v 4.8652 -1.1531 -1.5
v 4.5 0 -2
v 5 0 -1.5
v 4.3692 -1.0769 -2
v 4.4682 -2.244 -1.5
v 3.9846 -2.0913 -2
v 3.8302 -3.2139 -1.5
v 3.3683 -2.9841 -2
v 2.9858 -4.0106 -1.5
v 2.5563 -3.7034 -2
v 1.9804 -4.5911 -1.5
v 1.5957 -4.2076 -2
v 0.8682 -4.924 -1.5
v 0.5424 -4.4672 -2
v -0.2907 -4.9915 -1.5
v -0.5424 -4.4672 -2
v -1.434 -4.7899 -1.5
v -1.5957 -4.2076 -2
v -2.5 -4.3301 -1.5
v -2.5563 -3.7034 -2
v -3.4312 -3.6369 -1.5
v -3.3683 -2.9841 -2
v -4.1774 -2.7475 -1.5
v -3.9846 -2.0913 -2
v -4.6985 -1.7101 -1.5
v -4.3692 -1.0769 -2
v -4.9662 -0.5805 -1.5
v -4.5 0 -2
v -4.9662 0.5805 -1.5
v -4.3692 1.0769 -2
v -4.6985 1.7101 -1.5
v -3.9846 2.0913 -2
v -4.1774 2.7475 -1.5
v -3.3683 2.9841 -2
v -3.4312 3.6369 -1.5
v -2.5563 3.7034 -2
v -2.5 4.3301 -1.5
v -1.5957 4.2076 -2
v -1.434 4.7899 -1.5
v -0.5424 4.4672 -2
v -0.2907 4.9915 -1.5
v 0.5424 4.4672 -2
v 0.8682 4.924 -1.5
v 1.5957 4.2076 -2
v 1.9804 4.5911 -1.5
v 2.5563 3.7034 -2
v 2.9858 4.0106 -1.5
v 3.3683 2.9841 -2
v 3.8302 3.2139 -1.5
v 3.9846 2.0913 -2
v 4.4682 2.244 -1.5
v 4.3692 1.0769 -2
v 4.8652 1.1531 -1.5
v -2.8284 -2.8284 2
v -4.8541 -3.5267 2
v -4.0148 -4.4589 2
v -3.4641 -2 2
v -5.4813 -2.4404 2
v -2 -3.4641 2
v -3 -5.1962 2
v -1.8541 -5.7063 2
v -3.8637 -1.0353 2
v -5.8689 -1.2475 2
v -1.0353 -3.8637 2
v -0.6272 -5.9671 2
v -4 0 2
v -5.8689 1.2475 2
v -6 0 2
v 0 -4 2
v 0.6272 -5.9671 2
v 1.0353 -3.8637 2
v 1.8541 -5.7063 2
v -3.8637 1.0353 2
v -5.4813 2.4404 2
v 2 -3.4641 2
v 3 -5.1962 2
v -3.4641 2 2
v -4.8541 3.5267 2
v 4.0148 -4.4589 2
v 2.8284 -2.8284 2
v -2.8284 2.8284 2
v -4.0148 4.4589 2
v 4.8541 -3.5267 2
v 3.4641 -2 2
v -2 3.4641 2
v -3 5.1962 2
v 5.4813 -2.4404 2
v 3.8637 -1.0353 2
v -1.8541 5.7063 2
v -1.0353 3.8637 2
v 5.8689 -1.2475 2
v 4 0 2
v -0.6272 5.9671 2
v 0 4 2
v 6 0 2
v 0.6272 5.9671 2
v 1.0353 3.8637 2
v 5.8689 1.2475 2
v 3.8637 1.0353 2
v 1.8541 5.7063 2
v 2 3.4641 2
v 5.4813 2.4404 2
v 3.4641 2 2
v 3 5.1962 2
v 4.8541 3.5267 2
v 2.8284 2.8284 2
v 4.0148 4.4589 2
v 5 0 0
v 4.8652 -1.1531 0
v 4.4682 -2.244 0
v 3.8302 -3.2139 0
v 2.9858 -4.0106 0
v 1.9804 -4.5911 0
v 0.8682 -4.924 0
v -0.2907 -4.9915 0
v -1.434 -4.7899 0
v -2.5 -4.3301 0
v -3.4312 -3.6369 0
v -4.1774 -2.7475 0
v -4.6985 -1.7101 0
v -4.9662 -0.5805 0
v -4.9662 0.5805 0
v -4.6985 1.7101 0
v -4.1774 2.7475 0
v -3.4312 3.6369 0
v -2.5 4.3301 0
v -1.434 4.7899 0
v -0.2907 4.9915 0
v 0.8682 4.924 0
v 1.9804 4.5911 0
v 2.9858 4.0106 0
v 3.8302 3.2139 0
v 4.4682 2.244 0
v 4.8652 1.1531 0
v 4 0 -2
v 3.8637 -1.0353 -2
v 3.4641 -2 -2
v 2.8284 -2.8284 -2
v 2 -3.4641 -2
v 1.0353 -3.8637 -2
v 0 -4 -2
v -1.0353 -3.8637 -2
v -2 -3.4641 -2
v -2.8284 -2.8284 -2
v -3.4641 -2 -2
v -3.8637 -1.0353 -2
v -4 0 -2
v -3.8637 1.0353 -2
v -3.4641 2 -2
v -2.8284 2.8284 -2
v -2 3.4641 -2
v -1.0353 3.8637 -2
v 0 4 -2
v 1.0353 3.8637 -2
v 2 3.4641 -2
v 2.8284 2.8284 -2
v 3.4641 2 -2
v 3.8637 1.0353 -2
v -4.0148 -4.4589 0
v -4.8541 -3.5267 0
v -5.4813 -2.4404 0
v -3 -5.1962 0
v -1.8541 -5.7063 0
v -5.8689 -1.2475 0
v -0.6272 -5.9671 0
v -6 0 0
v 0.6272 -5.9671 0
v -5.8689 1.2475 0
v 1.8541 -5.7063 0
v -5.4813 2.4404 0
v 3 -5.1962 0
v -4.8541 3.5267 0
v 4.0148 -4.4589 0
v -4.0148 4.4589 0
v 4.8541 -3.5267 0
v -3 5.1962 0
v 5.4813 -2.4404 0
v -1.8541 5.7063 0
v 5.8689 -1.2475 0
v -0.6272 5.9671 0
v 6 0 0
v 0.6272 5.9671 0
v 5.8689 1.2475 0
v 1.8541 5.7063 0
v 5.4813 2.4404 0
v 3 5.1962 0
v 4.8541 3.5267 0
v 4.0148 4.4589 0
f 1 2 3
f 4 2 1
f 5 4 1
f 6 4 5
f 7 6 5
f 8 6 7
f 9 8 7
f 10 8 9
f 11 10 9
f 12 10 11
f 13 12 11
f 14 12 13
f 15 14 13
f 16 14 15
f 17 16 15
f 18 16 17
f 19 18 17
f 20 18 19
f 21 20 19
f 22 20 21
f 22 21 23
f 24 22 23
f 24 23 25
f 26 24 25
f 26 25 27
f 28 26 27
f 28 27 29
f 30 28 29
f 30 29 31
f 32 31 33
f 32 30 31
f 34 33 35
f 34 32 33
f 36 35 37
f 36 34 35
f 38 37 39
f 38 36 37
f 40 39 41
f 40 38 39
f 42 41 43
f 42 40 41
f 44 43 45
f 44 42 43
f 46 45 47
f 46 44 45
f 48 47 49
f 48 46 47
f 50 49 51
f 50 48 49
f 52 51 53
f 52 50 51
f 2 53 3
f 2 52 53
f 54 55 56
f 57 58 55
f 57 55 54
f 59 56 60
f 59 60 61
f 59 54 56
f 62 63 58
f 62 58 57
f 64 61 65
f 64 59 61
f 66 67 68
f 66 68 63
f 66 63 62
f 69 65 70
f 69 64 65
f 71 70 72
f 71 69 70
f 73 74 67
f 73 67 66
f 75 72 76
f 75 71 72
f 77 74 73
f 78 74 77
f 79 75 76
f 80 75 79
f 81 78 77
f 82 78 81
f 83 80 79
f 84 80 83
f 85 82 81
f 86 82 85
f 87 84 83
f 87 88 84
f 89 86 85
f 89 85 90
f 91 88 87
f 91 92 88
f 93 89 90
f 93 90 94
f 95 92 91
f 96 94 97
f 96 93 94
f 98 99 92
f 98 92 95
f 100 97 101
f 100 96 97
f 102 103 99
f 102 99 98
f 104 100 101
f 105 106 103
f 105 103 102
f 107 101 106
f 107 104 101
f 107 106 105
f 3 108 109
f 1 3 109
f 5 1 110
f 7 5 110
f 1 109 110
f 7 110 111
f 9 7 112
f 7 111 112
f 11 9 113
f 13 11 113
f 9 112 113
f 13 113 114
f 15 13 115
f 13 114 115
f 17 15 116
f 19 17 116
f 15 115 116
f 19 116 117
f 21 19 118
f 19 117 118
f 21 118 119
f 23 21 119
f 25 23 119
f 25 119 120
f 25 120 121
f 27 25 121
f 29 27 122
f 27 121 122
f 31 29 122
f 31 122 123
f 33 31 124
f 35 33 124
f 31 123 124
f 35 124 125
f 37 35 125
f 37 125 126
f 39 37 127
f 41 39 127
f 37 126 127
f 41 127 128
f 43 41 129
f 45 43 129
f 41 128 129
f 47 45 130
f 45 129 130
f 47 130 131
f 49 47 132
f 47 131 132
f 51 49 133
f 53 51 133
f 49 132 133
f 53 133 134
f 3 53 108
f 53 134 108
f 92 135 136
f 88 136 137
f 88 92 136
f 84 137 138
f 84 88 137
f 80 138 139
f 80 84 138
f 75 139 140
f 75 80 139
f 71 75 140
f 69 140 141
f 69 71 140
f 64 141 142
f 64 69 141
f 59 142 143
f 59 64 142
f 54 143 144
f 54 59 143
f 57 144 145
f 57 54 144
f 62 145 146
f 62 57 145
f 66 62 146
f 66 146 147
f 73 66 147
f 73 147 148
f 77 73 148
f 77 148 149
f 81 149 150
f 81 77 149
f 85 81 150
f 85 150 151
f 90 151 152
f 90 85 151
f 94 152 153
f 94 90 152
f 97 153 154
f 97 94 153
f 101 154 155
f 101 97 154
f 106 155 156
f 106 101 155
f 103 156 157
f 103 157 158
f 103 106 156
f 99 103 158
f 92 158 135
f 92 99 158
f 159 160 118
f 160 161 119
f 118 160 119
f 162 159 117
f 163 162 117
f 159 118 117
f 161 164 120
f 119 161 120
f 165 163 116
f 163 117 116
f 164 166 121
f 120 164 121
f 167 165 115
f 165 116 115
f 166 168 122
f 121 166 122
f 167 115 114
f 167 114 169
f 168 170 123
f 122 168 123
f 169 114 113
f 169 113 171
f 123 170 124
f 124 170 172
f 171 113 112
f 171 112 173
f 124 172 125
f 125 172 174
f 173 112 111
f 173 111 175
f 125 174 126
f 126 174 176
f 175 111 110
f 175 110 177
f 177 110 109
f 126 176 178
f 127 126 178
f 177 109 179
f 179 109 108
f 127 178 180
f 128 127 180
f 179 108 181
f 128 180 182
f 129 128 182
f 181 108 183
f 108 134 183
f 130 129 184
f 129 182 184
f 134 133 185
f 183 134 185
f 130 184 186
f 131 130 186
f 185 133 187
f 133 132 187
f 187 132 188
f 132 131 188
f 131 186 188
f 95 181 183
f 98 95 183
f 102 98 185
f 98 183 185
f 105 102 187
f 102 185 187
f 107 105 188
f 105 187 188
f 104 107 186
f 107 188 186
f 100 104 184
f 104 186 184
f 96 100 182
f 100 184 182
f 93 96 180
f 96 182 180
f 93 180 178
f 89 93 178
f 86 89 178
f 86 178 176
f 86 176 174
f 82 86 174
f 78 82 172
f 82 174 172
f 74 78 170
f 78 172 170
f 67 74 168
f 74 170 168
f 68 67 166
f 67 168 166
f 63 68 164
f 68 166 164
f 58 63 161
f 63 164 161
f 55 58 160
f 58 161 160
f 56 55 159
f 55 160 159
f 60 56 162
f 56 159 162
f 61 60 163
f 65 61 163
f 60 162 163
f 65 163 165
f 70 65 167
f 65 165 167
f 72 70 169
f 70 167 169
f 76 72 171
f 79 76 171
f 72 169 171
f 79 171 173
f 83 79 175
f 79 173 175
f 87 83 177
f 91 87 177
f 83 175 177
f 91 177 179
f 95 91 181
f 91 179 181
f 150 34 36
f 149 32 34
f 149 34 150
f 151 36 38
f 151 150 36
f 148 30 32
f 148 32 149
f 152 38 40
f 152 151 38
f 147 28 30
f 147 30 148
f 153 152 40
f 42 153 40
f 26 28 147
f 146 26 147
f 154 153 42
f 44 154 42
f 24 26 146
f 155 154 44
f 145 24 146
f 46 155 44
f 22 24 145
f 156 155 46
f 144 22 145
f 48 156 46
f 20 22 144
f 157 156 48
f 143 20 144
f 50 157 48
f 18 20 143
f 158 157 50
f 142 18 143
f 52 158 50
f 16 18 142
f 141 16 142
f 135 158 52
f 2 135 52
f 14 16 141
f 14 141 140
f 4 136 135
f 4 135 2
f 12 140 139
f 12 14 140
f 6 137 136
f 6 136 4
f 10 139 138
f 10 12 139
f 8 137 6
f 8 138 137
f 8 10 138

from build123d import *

# Parameters (mm, degrees)
F0_R     = 6
F0_R_2   = 4
F1_DEPTH = 2
F2_R     = 5
F2_R_2   = 4
F3_DEPTH = 2
F4_SIZE  = 0.5


with BuildPart() as f1:
    # F0 (on Top) → F1 (new body)
    with BuildSketch(Plane.XY):
        Circle(F0_R)
        Circle(F0_R_2, mode=Mode.SUBTRACT)
    extrude(amount=F1_DEPTH)

    # F2 (on face) → F3 (join)
    with BuildSketch(Plane(origin=(0, 0, 0), x_dir=(1, 0, 0), z_dir=(0, 0, -1))):
        Circle(F2_R)
        Circle(F2_R_2, mode=Mode.SUBTRACT)
    extrude(amount=F3_DEPTH)

    # F4
    f4_edges = [f1.edges().sort_by_distance(p)[0] for p in [
        (-5, 0, -2),
    ]]
    chamfer(f4_edges, length=F4_SIZE)


solid = f1.part
